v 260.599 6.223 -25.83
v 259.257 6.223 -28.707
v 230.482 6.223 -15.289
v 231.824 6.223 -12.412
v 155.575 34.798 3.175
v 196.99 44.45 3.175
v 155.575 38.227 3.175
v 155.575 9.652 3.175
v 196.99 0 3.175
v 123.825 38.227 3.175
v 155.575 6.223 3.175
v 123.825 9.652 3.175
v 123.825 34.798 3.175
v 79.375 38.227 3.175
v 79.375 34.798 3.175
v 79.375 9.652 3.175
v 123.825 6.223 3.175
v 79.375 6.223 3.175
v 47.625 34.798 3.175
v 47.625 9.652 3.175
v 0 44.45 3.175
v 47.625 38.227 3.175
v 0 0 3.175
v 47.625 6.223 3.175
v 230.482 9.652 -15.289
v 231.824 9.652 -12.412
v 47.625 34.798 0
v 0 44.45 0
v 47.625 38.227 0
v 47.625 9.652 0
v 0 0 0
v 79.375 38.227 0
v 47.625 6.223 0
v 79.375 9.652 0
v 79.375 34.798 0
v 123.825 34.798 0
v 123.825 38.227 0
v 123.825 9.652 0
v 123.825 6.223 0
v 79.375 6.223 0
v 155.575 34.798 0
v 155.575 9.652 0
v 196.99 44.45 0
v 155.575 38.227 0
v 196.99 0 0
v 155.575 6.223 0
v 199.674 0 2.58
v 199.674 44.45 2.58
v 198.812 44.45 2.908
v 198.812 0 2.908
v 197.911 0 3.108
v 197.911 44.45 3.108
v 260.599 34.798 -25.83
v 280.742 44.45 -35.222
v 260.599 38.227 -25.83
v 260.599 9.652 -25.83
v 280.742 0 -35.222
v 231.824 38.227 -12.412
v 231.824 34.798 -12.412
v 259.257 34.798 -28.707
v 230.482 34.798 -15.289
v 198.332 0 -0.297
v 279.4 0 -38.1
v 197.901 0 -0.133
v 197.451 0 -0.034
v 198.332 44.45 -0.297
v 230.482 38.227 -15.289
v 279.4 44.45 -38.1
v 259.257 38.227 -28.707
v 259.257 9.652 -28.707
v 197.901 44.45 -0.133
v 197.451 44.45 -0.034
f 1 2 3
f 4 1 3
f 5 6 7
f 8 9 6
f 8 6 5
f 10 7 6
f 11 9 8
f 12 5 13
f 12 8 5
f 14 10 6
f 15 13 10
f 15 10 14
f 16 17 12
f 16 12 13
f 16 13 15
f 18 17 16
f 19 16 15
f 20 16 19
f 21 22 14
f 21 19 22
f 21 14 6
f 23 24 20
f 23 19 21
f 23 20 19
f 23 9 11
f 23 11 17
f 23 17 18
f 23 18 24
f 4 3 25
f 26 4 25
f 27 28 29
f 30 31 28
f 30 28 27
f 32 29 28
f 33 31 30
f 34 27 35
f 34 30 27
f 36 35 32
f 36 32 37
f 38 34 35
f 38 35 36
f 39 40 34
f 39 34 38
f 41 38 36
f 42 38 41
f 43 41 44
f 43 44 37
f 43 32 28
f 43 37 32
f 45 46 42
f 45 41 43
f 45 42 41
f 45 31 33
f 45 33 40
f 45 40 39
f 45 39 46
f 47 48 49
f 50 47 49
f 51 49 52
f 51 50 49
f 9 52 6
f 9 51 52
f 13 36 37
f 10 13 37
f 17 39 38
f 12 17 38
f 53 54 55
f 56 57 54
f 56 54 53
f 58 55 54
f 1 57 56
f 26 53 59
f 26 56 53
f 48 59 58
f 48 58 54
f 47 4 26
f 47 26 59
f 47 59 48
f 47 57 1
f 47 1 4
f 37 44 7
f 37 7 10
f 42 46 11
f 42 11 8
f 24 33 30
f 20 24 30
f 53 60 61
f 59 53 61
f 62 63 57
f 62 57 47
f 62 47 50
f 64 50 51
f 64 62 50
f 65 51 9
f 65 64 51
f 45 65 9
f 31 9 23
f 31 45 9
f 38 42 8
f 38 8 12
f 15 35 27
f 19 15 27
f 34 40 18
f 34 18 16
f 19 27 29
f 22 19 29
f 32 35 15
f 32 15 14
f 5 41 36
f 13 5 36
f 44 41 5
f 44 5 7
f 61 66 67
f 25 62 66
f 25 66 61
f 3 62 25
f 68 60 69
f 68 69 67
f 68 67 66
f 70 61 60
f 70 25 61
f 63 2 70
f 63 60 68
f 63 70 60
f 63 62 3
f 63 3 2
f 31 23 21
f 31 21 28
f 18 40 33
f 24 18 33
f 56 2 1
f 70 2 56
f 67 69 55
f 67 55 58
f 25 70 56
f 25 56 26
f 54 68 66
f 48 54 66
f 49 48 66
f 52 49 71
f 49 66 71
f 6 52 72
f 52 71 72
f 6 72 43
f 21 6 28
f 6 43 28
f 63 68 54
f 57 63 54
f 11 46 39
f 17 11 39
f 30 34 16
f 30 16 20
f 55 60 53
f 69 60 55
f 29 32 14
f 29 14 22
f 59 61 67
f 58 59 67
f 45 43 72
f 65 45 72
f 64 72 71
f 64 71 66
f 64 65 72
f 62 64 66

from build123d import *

# Parameters (mm, degrees)
BASE_FLANGE1_DEPTH = 44.45
SKETCH6_W          = 31.75
SKETCH6_H          = 3.429
CUT_EXTRUDE1_DEPTH = 287.781062931
SKETCH7_W          = 31.75
SKETCH7_H          = 3.429
CUT_EXTRUDE2_DEPTH = 275.16810415


# Sheet-metal steps are written as plain solids
with BuildPart() as part:
    # Sketch1 → Base-Flange1 (new body)
    with BuildSketch(Plane(origin=(0, 0, 0), x_dir=(1, 0, 0), z_dir=(0, 1, 0))):
        with BuildLine():
            Line((0, 0), (196.990405775, 0))
            ThreePointArc((196.990405775, 0), (197.677601549, 0.075260177), (198.332218756, 0.297472776))
            Line((198.332218756, 0.297472776), (279.4, 38.1))
            Line((279.4, 38.1), (280.741812981, 35.222472776))
            Line((280.741812981, 35.222472776), (199.674031737, -2.580054448))
            ThreePointArc((199.674031737, -2.580054448), (198.364797323, -3.024479645), (196.990405775, -3.175))
            Line((196.990405775, -3.175), (0, -3.175))
            Line((0, -3.175), (0, 0))
        make_face()
    extrude(amount=BASE_FLANGE1_DEPTH)

    # Sketch6 → Cut-Extrude1 (cut, through all)
    with BuildSketch(Plane(origin=(0, 0, 0), x_dir=(-1, 0, 0), z_dir=(0, 0, -1))):
        with Locations((-139.7, 7.9375)):
            Rectangle(SKETCH6_W, SKETCH6_H)
        with Locations((-63.5, 36.5125)):
            Rectangle(SKETCH6_W, SKETCH6_H)
        with Locations((-139.7, 36.5125)):
            Rectangle(SKETCH6_W, SKETCH6_H)
        with Locations((-63.5, 7.9375)):
            Rectangle(SKETCH6_W, SKETCH6_H)
    extrude(amount=-CUT_EXTRUDE1_DEPTH, mode=Mode.SUBTRACT)

    # Sketch7 → Cut-Extrude2 (cut, through all)
    with BuildSketch(Plane(origin=(35.309424285, 0, 75.721304739), x_dir=(-0.9063077870366493, 0, 0.42261826174070083), z_dir=(-0.4226182617407009, 0, -0.9063077870366494))):
        with Locations((-231.22415147, 36.5125)):
            Rectangle(SKETCH7_W, SKETCH7_H)
        with Locations((-231.22415147, 7.9375)):
            Rectangle(SKETCH7_W, SKETCH7_H)
    extrude(amount=-CUT_EXTRUDE2_DEPTH, mode=Mode.SUBTRACT)


solid = part.part
